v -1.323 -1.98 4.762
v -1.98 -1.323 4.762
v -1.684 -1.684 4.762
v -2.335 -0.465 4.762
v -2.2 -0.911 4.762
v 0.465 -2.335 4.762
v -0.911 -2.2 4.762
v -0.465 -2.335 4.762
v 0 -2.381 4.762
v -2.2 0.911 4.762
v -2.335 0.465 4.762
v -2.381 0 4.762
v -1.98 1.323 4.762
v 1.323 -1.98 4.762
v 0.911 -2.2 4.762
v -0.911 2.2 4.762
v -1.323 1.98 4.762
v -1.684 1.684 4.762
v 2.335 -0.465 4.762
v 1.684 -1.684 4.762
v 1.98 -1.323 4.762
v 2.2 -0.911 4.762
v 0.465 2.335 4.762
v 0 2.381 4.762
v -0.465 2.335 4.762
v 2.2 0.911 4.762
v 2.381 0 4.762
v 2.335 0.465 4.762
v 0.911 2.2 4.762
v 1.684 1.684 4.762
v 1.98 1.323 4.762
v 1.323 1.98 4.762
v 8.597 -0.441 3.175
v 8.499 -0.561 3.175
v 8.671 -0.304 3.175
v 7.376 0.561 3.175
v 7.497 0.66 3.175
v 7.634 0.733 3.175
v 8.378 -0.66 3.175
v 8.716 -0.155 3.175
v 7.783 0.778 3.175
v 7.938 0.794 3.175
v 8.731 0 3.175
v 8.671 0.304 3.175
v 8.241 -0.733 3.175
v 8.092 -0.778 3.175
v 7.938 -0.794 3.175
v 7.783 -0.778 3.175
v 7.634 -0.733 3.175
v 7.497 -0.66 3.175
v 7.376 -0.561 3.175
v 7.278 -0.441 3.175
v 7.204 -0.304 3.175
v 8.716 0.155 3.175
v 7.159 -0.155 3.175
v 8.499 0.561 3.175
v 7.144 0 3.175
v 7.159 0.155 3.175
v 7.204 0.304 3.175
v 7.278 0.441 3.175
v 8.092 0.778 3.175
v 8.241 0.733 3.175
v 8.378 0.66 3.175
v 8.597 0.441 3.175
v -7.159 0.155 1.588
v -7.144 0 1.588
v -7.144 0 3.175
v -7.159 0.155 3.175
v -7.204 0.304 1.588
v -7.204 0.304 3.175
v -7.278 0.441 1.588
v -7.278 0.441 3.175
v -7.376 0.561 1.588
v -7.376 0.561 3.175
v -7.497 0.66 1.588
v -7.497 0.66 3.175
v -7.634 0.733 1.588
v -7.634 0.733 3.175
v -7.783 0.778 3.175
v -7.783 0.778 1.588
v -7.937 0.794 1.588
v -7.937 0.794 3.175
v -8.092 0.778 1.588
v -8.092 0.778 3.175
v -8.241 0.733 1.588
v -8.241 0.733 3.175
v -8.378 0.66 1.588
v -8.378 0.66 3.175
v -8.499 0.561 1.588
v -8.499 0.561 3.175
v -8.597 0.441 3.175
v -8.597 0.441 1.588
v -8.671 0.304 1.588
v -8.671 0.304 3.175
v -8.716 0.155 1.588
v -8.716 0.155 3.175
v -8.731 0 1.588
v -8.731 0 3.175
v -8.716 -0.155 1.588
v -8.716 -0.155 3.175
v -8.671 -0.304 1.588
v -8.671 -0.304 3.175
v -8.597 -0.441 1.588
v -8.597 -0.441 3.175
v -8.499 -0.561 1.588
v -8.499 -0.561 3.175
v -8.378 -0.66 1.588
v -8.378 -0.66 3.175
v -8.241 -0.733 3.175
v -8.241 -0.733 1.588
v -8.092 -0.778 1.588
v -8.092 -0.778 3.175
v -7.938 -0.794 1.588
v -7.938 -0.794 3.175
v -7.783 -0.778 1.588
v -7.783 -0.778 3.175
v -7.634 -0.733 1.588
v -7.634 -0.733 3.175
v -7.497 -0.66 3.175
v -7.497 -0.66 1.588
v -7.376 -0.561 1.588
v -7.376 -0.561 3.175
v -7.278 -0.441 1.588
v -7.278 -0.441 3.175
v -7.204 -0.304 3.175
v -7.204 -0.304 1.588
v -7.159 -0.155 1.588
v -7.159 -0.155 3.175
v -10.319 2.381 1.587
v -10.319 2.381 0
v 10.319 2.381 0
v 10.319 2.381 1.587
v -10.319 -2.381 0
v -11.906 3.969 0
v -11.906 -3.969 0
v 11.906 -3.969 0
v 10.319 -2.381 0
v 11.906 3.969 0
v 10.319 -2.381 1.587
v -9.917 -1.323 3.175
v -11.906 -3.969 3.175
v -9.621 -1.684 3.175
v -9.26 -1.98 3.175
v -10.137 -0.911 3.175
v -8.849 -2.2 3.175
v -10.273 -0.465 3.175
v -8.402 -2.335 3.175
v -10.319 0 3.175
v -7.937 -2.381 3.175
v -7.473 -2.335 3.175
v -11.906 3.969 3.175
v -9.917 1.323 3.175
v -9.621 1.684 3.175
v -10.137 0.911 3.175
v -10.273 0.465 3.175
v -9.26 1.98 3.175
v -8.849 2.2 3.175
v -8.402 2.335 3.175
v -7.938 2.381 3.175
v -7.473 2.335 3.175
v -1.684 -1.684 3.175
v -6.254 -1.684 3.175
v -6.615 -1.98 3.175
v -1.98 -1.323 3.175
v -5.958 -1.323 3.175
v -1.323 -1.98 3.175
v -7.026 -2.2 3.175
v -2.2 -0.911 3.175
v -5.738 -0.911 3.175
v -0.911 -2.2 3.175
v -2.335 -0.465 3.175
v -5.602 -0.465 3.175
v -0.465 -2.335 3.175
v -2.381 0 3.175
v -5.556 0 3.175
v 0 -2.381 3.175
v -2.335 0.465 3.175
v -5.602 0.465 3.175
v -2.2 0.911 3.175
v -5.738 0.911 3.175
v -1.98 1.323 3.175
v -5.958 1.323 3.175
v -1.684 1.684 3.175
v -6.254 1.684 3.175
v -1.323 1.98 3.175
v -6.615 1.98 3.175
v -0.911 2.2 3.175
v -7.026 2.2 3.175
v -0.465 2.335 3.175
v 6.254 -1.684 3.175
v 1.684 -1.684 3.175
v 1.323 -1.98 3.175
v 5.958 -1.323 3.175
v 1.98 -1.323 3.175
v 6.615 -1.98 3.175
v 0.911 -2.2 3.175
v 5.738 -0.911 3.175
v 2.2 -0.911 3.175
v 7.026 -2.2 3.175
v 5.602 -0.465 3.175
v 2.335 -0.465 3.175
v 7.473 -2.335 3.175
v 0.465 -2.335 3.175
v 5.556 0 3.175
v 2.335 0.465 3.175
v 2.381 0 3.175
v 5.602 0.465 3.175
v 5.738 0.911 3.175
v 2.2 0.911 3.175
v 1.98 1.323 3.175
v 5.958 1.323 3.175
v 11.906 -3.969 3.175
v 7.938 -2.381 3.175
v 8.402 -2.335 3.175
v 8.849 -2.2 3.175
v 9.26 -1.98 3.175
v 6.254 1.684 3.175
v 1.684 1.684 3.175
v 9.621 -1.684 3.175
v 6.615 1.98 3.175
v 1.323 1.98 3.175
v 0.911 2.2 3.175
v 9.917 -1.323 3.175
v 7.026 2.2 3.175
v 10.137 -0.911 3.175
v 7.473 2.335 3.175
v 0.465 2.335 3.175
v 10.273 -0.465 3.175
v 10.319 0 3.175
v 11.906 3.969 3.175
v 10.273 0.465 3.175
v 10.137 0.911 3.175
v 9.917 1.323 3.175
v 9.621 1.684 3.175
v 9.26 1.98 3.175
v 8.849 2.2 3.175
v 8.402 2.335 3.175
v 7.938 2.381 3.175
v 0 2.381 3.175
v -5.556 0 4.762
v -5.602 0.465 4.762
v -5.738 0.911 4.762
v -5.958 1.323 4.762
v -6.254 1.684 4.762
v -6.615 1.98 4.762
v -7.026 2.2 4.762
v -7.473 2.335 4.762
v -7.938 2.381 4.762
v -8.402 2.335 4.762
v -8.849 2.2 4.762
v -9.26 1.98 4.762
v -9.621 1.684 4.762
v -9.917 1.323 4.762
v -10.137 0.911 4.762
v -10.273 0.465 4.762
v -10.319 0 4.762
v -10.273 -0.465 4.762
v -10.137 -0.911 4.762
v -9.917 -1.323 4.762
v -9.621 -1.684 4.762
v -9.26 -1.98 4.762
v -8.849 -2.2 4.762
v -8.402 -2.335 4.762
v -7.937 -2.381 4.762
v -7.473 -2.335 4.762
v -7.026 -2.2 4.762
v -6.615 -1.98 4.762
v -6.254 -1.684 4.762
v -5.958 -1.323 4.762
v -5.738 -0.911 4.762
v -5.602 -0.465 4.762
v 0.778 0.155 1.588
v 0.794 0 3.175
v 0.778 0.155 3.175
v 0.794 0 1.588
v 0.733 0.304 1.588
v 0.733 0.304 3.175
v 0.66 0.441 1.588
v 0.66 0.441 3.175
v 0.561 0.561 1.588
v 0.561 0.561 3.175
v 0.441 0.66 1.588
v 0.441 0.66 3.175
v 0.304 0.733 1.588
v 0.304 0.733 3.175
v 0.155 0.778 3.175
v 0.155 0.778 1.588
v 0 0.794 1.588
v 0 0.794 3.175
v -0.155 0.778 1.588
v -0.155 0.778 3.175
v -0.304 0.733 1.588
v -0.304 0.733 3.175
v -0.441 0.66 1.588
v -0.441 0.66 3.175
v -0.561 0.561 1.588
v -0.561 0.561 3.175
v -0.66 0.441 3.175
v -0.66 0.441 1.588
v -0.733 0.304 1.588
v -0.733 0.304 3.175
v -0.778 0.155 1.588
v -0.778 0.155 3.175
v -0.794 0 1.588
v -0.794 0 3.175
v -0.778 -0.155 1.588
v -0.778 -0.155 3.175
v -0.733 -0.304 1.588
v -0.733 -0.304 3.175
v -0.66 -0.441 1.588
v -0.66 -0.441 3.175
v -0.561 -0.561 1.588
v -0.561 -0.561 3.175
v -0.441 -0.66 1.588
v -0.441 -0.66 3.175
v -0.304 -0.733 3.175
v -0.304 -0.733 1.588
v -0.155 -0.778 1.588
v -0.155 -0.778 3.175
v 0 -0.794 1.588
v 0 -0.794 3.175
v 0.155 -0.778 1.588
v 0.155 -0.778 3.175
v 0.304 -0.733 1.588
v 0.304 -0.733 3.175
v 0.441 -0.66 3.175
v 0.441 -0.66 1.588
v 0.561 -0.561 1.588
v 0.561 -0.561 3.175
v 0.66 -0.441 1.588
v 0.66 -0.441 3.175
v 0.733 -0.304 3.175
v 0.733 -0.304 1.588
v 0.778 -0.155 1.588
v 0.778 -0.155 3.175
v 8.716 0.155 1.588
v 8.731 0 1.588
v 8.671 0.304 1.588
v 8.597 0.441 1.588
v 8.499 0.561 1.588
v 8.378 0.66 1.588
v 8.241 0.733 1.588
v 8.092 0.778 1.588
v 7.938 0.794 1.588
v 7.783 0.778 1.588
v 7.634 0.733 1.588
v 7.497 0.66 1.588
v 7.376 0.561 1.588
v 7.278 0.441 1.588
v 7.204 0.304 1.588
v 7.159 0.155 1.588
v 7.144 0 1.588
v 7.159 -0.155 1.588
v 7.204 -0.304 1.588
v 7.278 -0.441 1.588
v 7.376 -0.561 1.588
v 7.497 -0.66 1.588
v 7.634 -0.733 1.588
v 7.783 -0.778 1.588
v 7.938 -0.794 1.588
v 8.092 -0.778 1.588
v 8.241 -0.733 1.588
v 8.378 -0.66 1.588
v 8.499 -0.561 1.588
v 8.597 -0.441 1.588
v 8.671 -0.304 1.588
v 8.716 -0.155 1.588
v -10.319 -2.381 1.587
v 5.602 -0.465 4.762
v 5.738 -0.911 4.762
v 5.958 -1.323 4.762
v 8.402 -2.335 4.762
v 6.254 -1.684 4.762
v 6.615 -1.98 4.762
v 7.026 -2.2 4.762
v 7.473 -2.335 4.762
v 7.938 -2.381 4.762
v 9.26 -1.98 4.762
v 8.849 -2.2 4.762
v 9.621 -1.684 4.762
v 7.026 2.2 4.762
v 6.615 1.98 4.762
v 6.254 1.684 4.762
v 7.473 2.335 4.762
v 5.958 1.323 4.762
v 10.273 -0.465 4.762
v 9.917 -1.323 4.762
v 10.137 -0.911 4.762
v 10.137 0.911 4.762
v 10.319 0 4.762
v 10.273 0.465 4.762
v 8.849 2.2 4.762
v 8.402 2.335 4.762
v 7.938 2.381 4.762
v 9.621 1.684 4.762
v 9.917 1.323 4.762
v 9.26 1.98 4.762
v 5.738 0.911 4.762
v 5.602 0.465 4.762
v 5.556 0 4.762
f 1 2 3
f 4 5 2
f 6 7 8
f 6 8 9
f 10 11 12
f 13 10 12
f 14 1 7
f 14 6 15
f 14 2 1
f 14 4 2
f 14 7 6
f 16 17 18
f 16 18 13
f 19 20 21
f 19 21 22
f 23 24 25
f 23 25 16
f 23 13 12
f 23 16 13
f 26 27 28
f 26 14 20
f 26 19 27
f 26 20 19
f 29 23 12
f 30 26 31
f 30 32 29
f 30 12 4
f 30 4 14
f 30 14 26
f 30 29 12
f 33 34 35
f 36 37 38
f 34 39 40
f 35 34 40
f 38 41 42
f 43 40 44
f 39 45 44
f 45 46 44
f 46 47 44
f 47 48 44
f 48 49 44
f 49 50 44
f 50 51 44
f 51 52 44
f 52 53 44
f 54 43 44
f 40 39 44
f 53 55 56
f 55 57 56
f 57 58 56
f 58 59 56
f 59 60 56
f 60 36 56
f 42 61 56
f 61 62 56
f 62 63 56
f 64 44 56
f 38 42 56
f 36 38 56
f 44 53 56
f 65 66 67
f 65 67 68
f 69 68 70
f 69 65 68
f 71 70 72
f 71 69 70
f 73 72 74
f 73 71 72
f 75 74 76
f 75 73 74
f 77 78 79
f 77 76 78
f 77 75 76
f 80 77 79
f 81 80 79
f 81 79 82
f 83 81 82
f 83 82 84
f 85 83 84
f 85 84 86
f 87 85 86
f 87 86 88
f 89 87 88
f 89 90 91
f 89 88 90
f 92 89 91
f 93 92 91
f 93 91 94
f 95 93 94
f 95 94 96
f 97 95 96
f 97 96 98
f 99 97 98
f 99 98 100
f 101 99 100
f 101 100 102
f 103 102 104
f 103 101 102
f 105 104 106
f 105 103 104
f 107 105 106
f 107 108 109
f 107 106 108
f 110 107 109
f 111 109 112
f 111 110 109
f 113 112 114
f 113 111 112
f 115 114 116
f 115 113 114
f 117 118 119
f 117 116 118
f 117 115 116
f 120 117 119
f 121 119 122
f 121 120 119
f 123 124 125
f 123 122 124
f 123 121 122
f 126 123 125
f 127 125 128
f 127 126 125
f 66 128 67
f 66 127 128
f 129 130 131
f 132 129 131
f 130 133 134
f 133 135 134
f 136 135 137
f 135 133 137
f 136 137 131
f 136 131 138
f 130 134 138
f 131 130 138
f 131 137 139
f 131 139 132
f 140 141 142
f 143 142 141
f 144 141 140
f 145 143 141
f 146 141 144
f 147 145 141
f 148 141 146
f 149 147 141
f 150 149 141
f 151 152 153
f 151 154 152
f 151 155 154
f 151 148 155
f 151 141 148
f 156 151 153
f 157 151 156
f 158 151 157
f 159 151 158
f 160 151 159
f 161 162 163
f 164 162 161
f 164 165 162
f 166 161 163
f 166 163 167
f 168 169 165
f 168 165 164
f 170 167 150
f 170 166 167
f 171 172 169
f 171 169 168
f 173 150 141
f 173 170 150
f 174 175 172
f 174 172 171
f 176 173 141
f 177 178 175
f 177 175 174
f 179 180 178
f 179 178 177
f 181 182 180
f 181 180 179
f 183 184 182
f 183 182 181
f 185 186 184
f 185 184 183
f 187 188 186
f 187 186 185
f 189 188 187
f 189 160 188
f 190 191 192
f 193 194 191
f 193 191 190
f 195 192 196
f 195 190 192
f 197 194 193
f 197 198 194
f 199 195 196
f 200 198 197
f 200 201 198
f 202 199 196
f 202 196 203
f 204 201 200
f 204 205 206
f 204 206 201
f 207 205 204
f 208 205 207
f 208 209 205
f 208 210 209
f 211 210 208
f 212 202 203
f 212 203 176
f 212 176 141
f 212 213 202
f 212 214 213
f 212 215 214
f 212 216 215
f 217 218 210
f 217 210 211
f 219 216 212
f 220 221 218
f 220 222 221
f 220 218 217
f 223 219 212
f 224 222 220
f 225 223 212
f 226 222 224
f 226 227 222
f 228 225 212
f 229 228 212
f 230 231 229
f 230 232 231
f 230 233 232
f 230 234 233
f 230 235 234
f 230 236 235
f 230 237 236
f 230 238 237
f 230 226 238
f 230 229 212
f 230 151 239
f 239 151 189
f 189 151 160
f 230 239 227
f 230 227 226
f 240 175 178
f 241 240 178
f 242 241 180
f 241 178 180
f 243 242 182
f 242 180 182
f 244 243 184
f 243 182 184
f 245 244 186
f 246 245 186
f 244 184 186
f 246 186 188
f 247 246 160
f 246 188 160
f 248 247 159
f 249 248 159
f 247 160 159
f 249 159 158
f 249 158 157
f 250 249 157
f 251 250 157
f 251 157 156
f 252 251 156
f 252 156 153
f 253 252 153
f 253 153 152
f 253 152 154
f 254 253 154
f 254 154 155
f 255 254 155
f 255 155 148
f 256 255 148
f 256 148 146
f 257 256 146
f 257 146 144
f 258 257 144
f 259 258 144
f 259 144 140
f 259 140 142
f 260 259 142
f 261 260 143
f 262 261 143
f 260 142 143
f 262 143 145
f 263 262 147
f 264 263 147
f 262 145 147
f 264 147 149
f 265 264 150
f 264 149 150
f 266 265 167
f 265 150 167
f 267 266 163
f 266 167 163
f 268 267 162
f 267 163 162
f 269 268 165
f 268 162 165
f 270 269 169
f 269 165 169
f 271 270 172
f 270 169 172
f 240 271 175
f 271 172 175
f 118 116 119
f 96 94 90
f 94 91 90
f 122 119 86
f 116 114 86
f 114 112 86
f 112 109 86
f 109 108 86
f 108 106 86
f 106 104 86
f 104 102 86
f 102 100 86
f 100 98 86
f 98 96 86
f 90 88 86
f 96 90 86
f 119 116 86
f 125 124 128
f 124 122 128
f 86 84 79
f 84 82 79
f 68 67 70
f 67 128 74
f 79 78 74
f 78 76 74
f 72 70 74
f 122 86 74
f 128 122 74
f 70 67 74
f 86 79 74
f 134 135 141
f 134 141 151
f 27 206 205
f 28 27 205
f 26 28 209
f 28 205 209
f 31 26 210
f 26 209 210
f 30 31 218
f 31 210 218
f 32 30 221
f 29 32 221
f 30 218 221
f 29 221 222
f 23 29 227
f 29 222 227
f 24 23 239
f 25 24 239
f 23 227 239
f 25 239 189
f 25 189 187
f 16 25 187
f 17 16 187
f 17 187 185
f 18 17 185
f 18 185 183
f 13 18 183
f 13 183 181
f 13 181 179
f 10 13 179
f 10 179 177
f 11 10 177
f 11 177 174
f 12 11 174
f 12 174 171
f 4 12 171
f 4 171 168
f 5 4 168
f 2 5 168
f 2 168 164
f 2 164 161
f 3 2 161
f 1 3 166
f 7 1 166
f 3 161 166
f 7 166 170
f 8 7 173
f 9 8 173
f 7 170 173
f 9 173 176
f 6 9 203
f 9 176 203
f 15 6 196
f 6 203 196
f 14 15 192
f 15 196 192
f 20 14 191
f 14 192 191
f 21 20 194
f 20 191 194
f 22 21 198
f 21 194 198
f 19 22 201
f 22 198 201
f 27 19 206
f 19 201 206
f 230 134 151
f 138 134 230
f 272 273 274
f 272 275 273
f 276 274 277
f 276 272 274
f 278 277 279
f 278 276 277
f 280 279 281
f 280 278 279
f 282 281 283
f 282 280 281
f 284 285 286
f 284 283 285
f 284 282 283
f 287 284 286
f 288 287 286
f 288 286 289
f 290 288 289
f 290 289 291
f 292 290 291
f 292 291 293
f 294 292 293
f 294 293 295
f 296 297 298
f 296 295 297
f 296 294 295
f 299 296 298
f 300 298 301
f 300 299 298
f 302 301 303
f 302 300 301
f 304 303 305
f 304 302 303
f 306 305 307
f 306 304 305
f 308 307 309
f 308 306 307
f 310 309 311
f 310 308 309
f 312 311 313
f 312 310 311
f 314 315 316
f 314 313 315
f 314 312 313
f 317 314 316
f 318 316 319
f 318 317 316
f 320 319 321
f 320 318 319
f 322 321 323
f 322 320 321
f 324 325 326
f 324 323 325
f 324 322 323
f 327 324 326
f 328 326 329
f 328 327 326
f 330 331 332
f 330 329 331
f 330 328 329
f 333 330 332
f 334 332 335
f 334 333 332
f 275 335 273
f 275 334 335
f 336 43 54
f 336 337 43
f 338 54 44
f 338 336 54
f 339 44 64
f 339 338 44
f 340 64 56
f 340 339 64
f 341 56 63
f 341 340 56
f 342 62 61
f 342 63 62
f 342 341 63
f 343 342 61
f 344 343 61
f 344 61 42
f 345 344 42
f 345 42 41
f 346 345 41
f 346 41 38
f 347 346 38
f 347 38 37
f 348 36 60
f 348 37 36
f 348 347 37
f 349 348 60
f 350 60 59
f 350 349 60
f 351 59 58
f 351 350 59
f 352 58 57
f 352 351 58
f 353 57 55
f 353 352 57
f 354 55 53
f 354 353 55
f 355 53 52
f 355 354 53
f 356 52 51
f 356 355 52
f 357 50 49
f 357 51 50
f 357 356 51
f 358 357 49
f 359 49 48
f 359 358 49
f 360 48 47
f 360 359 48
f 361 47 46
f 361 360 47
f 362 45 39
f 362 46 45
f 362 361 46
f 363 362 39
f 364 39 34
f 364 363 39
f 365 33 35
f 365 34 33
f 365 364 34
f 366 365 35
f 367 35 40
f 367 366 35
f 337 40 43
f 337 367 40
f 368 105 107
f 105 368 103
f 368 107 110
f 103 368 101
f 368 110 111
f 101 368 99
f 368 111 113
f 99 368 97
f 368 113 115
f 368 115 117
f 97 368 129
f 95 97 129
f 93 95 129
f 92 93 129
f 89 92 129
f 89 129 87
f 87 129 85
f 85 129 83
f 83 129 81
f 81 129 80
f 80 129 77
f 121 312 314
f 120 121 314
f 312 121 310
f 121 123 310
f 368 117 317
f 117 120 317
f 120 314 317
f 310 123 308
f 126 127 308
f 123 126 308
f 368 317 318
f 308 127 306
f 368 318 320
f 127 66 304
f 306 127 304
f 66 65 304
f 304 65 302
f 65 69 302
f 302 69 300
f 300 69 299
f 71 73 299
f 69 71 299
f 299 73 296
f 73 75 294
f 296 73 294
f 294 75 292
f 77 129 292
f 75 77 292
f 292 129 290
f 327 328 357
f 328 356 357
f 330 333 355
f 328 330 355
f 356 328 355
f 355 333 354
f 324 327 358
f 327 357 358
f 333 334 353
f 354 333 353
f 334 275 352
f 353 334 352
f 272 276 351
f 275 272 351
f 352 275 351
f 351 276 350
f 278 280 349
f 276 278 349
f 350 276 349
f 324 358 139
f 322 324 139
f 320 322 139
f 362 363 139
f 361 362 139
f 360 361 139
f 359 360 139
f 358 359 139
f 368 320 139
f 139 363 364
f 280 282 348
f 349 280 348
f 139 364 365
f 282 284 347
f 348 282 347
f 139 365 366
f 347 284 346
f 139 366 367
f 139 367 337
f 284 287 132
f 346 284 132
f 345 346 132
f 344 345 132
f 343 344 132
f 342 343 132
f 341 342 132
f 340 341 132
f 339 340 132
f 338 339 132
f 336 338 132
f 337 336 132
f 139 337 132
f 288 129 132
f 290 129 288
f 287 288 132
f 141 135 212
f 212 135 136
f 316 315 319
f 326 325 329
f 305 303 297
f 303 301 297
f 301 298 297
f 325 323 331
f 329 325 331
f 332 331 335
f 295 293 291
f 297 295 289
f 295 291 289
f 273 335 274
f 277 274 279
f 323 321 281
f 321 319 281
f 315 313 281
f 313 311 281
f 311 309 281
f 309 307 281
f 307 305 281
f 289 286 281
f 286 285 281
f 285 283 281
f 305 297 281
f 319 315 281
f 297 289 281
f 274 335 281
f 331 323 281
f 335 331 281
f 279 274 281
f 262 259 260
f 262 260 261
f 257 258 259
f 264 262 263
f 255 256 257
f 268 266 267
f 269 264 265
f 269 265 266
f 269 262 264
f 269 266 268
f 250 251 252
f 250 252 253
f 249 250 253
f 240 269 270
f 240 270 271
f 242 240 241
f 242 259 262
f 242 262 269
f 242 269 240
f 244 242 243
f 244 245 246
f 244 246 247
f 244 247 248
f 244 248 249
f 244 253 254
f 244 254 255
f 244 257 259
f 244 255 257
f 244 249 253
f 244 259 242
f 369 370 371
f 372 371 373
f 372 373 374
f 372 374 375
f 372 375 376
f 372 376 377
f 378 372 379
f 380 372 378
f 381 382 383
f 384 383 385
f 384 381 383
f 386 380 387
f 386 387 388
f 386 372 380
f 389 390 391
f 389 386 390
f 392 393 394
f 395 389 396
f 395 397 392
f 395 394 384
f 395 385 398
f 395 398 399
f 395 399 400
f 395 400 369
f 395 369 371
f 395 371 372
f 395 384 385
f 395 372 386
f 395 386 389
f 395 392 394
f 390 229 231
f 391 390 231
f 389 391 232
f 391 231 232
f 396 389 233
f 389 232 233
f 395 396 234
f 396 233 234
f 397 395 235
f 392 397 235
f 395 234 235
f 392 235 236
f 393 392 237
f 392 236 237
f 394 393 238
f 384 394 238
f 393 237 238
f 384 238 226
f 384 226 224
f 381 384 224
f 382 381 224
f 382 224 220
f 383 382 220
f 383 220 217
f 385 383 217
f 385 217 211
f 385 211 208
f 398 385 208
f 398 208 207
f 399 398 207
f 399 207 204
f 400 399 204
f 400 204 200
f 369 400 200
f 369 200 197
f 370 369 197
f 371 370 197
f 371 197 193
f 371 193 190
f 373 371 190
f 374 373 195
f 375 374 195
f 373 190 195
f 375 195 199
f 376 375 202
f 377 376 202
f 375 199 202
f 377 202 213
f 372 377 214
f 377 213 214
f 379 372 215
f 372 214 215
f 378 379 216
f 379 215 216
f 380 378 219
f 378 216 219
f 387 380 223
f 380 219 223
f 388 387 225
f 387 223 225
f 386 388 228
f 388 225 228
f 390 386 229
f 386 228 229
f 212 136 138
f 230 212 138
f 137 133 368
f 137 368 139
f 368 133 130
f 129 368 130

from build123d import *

# Parameters (mm, degrees)
F0_W     = 23.8125
F0_H     = 7.9375
F0_R     = 2.38125
F1_DEPTH = 3.175
F2_DEPTH = 4.7625
F3_T     = -1.5875


with BuildPart() as f1:
    # F0 (on Top) → F1 (new body)
    with BuildSketch(Plane.XY):
        Rectangle(F0_W, F0_H)
        with Locations((-7.9375, 0)):
            Circle(F0_R, mode=Mode.SUBTRACT)
        Circle(F0_R, mode=Mode.SUBTRACT)
        with Locations((7.9375, 0)):
            Circle(F0_R, mode=Mode.SUBTRACT)
    extrude(amount=F1_DEPTH)

    # F0 (on Top) → F2 (join)
    with BuildSketch(Plane.XY):
        with Locations((-7.9375, 0)):
            Circle(F0_R)
        Circle(F0_R)
        with Locations((7.9375, 0)):
            Circle(F0_R)
    extrude(amount=F2_DEPTH)

    # F3
    f3_openings = [f1.faces().sort_by_distance(p)[0] for p in [
        (0, 0, 0),
    ]]
    offset(amount=F3_T, openings=f3_openings, kind=Kind.INTERSECTION)


solid = f1.part
